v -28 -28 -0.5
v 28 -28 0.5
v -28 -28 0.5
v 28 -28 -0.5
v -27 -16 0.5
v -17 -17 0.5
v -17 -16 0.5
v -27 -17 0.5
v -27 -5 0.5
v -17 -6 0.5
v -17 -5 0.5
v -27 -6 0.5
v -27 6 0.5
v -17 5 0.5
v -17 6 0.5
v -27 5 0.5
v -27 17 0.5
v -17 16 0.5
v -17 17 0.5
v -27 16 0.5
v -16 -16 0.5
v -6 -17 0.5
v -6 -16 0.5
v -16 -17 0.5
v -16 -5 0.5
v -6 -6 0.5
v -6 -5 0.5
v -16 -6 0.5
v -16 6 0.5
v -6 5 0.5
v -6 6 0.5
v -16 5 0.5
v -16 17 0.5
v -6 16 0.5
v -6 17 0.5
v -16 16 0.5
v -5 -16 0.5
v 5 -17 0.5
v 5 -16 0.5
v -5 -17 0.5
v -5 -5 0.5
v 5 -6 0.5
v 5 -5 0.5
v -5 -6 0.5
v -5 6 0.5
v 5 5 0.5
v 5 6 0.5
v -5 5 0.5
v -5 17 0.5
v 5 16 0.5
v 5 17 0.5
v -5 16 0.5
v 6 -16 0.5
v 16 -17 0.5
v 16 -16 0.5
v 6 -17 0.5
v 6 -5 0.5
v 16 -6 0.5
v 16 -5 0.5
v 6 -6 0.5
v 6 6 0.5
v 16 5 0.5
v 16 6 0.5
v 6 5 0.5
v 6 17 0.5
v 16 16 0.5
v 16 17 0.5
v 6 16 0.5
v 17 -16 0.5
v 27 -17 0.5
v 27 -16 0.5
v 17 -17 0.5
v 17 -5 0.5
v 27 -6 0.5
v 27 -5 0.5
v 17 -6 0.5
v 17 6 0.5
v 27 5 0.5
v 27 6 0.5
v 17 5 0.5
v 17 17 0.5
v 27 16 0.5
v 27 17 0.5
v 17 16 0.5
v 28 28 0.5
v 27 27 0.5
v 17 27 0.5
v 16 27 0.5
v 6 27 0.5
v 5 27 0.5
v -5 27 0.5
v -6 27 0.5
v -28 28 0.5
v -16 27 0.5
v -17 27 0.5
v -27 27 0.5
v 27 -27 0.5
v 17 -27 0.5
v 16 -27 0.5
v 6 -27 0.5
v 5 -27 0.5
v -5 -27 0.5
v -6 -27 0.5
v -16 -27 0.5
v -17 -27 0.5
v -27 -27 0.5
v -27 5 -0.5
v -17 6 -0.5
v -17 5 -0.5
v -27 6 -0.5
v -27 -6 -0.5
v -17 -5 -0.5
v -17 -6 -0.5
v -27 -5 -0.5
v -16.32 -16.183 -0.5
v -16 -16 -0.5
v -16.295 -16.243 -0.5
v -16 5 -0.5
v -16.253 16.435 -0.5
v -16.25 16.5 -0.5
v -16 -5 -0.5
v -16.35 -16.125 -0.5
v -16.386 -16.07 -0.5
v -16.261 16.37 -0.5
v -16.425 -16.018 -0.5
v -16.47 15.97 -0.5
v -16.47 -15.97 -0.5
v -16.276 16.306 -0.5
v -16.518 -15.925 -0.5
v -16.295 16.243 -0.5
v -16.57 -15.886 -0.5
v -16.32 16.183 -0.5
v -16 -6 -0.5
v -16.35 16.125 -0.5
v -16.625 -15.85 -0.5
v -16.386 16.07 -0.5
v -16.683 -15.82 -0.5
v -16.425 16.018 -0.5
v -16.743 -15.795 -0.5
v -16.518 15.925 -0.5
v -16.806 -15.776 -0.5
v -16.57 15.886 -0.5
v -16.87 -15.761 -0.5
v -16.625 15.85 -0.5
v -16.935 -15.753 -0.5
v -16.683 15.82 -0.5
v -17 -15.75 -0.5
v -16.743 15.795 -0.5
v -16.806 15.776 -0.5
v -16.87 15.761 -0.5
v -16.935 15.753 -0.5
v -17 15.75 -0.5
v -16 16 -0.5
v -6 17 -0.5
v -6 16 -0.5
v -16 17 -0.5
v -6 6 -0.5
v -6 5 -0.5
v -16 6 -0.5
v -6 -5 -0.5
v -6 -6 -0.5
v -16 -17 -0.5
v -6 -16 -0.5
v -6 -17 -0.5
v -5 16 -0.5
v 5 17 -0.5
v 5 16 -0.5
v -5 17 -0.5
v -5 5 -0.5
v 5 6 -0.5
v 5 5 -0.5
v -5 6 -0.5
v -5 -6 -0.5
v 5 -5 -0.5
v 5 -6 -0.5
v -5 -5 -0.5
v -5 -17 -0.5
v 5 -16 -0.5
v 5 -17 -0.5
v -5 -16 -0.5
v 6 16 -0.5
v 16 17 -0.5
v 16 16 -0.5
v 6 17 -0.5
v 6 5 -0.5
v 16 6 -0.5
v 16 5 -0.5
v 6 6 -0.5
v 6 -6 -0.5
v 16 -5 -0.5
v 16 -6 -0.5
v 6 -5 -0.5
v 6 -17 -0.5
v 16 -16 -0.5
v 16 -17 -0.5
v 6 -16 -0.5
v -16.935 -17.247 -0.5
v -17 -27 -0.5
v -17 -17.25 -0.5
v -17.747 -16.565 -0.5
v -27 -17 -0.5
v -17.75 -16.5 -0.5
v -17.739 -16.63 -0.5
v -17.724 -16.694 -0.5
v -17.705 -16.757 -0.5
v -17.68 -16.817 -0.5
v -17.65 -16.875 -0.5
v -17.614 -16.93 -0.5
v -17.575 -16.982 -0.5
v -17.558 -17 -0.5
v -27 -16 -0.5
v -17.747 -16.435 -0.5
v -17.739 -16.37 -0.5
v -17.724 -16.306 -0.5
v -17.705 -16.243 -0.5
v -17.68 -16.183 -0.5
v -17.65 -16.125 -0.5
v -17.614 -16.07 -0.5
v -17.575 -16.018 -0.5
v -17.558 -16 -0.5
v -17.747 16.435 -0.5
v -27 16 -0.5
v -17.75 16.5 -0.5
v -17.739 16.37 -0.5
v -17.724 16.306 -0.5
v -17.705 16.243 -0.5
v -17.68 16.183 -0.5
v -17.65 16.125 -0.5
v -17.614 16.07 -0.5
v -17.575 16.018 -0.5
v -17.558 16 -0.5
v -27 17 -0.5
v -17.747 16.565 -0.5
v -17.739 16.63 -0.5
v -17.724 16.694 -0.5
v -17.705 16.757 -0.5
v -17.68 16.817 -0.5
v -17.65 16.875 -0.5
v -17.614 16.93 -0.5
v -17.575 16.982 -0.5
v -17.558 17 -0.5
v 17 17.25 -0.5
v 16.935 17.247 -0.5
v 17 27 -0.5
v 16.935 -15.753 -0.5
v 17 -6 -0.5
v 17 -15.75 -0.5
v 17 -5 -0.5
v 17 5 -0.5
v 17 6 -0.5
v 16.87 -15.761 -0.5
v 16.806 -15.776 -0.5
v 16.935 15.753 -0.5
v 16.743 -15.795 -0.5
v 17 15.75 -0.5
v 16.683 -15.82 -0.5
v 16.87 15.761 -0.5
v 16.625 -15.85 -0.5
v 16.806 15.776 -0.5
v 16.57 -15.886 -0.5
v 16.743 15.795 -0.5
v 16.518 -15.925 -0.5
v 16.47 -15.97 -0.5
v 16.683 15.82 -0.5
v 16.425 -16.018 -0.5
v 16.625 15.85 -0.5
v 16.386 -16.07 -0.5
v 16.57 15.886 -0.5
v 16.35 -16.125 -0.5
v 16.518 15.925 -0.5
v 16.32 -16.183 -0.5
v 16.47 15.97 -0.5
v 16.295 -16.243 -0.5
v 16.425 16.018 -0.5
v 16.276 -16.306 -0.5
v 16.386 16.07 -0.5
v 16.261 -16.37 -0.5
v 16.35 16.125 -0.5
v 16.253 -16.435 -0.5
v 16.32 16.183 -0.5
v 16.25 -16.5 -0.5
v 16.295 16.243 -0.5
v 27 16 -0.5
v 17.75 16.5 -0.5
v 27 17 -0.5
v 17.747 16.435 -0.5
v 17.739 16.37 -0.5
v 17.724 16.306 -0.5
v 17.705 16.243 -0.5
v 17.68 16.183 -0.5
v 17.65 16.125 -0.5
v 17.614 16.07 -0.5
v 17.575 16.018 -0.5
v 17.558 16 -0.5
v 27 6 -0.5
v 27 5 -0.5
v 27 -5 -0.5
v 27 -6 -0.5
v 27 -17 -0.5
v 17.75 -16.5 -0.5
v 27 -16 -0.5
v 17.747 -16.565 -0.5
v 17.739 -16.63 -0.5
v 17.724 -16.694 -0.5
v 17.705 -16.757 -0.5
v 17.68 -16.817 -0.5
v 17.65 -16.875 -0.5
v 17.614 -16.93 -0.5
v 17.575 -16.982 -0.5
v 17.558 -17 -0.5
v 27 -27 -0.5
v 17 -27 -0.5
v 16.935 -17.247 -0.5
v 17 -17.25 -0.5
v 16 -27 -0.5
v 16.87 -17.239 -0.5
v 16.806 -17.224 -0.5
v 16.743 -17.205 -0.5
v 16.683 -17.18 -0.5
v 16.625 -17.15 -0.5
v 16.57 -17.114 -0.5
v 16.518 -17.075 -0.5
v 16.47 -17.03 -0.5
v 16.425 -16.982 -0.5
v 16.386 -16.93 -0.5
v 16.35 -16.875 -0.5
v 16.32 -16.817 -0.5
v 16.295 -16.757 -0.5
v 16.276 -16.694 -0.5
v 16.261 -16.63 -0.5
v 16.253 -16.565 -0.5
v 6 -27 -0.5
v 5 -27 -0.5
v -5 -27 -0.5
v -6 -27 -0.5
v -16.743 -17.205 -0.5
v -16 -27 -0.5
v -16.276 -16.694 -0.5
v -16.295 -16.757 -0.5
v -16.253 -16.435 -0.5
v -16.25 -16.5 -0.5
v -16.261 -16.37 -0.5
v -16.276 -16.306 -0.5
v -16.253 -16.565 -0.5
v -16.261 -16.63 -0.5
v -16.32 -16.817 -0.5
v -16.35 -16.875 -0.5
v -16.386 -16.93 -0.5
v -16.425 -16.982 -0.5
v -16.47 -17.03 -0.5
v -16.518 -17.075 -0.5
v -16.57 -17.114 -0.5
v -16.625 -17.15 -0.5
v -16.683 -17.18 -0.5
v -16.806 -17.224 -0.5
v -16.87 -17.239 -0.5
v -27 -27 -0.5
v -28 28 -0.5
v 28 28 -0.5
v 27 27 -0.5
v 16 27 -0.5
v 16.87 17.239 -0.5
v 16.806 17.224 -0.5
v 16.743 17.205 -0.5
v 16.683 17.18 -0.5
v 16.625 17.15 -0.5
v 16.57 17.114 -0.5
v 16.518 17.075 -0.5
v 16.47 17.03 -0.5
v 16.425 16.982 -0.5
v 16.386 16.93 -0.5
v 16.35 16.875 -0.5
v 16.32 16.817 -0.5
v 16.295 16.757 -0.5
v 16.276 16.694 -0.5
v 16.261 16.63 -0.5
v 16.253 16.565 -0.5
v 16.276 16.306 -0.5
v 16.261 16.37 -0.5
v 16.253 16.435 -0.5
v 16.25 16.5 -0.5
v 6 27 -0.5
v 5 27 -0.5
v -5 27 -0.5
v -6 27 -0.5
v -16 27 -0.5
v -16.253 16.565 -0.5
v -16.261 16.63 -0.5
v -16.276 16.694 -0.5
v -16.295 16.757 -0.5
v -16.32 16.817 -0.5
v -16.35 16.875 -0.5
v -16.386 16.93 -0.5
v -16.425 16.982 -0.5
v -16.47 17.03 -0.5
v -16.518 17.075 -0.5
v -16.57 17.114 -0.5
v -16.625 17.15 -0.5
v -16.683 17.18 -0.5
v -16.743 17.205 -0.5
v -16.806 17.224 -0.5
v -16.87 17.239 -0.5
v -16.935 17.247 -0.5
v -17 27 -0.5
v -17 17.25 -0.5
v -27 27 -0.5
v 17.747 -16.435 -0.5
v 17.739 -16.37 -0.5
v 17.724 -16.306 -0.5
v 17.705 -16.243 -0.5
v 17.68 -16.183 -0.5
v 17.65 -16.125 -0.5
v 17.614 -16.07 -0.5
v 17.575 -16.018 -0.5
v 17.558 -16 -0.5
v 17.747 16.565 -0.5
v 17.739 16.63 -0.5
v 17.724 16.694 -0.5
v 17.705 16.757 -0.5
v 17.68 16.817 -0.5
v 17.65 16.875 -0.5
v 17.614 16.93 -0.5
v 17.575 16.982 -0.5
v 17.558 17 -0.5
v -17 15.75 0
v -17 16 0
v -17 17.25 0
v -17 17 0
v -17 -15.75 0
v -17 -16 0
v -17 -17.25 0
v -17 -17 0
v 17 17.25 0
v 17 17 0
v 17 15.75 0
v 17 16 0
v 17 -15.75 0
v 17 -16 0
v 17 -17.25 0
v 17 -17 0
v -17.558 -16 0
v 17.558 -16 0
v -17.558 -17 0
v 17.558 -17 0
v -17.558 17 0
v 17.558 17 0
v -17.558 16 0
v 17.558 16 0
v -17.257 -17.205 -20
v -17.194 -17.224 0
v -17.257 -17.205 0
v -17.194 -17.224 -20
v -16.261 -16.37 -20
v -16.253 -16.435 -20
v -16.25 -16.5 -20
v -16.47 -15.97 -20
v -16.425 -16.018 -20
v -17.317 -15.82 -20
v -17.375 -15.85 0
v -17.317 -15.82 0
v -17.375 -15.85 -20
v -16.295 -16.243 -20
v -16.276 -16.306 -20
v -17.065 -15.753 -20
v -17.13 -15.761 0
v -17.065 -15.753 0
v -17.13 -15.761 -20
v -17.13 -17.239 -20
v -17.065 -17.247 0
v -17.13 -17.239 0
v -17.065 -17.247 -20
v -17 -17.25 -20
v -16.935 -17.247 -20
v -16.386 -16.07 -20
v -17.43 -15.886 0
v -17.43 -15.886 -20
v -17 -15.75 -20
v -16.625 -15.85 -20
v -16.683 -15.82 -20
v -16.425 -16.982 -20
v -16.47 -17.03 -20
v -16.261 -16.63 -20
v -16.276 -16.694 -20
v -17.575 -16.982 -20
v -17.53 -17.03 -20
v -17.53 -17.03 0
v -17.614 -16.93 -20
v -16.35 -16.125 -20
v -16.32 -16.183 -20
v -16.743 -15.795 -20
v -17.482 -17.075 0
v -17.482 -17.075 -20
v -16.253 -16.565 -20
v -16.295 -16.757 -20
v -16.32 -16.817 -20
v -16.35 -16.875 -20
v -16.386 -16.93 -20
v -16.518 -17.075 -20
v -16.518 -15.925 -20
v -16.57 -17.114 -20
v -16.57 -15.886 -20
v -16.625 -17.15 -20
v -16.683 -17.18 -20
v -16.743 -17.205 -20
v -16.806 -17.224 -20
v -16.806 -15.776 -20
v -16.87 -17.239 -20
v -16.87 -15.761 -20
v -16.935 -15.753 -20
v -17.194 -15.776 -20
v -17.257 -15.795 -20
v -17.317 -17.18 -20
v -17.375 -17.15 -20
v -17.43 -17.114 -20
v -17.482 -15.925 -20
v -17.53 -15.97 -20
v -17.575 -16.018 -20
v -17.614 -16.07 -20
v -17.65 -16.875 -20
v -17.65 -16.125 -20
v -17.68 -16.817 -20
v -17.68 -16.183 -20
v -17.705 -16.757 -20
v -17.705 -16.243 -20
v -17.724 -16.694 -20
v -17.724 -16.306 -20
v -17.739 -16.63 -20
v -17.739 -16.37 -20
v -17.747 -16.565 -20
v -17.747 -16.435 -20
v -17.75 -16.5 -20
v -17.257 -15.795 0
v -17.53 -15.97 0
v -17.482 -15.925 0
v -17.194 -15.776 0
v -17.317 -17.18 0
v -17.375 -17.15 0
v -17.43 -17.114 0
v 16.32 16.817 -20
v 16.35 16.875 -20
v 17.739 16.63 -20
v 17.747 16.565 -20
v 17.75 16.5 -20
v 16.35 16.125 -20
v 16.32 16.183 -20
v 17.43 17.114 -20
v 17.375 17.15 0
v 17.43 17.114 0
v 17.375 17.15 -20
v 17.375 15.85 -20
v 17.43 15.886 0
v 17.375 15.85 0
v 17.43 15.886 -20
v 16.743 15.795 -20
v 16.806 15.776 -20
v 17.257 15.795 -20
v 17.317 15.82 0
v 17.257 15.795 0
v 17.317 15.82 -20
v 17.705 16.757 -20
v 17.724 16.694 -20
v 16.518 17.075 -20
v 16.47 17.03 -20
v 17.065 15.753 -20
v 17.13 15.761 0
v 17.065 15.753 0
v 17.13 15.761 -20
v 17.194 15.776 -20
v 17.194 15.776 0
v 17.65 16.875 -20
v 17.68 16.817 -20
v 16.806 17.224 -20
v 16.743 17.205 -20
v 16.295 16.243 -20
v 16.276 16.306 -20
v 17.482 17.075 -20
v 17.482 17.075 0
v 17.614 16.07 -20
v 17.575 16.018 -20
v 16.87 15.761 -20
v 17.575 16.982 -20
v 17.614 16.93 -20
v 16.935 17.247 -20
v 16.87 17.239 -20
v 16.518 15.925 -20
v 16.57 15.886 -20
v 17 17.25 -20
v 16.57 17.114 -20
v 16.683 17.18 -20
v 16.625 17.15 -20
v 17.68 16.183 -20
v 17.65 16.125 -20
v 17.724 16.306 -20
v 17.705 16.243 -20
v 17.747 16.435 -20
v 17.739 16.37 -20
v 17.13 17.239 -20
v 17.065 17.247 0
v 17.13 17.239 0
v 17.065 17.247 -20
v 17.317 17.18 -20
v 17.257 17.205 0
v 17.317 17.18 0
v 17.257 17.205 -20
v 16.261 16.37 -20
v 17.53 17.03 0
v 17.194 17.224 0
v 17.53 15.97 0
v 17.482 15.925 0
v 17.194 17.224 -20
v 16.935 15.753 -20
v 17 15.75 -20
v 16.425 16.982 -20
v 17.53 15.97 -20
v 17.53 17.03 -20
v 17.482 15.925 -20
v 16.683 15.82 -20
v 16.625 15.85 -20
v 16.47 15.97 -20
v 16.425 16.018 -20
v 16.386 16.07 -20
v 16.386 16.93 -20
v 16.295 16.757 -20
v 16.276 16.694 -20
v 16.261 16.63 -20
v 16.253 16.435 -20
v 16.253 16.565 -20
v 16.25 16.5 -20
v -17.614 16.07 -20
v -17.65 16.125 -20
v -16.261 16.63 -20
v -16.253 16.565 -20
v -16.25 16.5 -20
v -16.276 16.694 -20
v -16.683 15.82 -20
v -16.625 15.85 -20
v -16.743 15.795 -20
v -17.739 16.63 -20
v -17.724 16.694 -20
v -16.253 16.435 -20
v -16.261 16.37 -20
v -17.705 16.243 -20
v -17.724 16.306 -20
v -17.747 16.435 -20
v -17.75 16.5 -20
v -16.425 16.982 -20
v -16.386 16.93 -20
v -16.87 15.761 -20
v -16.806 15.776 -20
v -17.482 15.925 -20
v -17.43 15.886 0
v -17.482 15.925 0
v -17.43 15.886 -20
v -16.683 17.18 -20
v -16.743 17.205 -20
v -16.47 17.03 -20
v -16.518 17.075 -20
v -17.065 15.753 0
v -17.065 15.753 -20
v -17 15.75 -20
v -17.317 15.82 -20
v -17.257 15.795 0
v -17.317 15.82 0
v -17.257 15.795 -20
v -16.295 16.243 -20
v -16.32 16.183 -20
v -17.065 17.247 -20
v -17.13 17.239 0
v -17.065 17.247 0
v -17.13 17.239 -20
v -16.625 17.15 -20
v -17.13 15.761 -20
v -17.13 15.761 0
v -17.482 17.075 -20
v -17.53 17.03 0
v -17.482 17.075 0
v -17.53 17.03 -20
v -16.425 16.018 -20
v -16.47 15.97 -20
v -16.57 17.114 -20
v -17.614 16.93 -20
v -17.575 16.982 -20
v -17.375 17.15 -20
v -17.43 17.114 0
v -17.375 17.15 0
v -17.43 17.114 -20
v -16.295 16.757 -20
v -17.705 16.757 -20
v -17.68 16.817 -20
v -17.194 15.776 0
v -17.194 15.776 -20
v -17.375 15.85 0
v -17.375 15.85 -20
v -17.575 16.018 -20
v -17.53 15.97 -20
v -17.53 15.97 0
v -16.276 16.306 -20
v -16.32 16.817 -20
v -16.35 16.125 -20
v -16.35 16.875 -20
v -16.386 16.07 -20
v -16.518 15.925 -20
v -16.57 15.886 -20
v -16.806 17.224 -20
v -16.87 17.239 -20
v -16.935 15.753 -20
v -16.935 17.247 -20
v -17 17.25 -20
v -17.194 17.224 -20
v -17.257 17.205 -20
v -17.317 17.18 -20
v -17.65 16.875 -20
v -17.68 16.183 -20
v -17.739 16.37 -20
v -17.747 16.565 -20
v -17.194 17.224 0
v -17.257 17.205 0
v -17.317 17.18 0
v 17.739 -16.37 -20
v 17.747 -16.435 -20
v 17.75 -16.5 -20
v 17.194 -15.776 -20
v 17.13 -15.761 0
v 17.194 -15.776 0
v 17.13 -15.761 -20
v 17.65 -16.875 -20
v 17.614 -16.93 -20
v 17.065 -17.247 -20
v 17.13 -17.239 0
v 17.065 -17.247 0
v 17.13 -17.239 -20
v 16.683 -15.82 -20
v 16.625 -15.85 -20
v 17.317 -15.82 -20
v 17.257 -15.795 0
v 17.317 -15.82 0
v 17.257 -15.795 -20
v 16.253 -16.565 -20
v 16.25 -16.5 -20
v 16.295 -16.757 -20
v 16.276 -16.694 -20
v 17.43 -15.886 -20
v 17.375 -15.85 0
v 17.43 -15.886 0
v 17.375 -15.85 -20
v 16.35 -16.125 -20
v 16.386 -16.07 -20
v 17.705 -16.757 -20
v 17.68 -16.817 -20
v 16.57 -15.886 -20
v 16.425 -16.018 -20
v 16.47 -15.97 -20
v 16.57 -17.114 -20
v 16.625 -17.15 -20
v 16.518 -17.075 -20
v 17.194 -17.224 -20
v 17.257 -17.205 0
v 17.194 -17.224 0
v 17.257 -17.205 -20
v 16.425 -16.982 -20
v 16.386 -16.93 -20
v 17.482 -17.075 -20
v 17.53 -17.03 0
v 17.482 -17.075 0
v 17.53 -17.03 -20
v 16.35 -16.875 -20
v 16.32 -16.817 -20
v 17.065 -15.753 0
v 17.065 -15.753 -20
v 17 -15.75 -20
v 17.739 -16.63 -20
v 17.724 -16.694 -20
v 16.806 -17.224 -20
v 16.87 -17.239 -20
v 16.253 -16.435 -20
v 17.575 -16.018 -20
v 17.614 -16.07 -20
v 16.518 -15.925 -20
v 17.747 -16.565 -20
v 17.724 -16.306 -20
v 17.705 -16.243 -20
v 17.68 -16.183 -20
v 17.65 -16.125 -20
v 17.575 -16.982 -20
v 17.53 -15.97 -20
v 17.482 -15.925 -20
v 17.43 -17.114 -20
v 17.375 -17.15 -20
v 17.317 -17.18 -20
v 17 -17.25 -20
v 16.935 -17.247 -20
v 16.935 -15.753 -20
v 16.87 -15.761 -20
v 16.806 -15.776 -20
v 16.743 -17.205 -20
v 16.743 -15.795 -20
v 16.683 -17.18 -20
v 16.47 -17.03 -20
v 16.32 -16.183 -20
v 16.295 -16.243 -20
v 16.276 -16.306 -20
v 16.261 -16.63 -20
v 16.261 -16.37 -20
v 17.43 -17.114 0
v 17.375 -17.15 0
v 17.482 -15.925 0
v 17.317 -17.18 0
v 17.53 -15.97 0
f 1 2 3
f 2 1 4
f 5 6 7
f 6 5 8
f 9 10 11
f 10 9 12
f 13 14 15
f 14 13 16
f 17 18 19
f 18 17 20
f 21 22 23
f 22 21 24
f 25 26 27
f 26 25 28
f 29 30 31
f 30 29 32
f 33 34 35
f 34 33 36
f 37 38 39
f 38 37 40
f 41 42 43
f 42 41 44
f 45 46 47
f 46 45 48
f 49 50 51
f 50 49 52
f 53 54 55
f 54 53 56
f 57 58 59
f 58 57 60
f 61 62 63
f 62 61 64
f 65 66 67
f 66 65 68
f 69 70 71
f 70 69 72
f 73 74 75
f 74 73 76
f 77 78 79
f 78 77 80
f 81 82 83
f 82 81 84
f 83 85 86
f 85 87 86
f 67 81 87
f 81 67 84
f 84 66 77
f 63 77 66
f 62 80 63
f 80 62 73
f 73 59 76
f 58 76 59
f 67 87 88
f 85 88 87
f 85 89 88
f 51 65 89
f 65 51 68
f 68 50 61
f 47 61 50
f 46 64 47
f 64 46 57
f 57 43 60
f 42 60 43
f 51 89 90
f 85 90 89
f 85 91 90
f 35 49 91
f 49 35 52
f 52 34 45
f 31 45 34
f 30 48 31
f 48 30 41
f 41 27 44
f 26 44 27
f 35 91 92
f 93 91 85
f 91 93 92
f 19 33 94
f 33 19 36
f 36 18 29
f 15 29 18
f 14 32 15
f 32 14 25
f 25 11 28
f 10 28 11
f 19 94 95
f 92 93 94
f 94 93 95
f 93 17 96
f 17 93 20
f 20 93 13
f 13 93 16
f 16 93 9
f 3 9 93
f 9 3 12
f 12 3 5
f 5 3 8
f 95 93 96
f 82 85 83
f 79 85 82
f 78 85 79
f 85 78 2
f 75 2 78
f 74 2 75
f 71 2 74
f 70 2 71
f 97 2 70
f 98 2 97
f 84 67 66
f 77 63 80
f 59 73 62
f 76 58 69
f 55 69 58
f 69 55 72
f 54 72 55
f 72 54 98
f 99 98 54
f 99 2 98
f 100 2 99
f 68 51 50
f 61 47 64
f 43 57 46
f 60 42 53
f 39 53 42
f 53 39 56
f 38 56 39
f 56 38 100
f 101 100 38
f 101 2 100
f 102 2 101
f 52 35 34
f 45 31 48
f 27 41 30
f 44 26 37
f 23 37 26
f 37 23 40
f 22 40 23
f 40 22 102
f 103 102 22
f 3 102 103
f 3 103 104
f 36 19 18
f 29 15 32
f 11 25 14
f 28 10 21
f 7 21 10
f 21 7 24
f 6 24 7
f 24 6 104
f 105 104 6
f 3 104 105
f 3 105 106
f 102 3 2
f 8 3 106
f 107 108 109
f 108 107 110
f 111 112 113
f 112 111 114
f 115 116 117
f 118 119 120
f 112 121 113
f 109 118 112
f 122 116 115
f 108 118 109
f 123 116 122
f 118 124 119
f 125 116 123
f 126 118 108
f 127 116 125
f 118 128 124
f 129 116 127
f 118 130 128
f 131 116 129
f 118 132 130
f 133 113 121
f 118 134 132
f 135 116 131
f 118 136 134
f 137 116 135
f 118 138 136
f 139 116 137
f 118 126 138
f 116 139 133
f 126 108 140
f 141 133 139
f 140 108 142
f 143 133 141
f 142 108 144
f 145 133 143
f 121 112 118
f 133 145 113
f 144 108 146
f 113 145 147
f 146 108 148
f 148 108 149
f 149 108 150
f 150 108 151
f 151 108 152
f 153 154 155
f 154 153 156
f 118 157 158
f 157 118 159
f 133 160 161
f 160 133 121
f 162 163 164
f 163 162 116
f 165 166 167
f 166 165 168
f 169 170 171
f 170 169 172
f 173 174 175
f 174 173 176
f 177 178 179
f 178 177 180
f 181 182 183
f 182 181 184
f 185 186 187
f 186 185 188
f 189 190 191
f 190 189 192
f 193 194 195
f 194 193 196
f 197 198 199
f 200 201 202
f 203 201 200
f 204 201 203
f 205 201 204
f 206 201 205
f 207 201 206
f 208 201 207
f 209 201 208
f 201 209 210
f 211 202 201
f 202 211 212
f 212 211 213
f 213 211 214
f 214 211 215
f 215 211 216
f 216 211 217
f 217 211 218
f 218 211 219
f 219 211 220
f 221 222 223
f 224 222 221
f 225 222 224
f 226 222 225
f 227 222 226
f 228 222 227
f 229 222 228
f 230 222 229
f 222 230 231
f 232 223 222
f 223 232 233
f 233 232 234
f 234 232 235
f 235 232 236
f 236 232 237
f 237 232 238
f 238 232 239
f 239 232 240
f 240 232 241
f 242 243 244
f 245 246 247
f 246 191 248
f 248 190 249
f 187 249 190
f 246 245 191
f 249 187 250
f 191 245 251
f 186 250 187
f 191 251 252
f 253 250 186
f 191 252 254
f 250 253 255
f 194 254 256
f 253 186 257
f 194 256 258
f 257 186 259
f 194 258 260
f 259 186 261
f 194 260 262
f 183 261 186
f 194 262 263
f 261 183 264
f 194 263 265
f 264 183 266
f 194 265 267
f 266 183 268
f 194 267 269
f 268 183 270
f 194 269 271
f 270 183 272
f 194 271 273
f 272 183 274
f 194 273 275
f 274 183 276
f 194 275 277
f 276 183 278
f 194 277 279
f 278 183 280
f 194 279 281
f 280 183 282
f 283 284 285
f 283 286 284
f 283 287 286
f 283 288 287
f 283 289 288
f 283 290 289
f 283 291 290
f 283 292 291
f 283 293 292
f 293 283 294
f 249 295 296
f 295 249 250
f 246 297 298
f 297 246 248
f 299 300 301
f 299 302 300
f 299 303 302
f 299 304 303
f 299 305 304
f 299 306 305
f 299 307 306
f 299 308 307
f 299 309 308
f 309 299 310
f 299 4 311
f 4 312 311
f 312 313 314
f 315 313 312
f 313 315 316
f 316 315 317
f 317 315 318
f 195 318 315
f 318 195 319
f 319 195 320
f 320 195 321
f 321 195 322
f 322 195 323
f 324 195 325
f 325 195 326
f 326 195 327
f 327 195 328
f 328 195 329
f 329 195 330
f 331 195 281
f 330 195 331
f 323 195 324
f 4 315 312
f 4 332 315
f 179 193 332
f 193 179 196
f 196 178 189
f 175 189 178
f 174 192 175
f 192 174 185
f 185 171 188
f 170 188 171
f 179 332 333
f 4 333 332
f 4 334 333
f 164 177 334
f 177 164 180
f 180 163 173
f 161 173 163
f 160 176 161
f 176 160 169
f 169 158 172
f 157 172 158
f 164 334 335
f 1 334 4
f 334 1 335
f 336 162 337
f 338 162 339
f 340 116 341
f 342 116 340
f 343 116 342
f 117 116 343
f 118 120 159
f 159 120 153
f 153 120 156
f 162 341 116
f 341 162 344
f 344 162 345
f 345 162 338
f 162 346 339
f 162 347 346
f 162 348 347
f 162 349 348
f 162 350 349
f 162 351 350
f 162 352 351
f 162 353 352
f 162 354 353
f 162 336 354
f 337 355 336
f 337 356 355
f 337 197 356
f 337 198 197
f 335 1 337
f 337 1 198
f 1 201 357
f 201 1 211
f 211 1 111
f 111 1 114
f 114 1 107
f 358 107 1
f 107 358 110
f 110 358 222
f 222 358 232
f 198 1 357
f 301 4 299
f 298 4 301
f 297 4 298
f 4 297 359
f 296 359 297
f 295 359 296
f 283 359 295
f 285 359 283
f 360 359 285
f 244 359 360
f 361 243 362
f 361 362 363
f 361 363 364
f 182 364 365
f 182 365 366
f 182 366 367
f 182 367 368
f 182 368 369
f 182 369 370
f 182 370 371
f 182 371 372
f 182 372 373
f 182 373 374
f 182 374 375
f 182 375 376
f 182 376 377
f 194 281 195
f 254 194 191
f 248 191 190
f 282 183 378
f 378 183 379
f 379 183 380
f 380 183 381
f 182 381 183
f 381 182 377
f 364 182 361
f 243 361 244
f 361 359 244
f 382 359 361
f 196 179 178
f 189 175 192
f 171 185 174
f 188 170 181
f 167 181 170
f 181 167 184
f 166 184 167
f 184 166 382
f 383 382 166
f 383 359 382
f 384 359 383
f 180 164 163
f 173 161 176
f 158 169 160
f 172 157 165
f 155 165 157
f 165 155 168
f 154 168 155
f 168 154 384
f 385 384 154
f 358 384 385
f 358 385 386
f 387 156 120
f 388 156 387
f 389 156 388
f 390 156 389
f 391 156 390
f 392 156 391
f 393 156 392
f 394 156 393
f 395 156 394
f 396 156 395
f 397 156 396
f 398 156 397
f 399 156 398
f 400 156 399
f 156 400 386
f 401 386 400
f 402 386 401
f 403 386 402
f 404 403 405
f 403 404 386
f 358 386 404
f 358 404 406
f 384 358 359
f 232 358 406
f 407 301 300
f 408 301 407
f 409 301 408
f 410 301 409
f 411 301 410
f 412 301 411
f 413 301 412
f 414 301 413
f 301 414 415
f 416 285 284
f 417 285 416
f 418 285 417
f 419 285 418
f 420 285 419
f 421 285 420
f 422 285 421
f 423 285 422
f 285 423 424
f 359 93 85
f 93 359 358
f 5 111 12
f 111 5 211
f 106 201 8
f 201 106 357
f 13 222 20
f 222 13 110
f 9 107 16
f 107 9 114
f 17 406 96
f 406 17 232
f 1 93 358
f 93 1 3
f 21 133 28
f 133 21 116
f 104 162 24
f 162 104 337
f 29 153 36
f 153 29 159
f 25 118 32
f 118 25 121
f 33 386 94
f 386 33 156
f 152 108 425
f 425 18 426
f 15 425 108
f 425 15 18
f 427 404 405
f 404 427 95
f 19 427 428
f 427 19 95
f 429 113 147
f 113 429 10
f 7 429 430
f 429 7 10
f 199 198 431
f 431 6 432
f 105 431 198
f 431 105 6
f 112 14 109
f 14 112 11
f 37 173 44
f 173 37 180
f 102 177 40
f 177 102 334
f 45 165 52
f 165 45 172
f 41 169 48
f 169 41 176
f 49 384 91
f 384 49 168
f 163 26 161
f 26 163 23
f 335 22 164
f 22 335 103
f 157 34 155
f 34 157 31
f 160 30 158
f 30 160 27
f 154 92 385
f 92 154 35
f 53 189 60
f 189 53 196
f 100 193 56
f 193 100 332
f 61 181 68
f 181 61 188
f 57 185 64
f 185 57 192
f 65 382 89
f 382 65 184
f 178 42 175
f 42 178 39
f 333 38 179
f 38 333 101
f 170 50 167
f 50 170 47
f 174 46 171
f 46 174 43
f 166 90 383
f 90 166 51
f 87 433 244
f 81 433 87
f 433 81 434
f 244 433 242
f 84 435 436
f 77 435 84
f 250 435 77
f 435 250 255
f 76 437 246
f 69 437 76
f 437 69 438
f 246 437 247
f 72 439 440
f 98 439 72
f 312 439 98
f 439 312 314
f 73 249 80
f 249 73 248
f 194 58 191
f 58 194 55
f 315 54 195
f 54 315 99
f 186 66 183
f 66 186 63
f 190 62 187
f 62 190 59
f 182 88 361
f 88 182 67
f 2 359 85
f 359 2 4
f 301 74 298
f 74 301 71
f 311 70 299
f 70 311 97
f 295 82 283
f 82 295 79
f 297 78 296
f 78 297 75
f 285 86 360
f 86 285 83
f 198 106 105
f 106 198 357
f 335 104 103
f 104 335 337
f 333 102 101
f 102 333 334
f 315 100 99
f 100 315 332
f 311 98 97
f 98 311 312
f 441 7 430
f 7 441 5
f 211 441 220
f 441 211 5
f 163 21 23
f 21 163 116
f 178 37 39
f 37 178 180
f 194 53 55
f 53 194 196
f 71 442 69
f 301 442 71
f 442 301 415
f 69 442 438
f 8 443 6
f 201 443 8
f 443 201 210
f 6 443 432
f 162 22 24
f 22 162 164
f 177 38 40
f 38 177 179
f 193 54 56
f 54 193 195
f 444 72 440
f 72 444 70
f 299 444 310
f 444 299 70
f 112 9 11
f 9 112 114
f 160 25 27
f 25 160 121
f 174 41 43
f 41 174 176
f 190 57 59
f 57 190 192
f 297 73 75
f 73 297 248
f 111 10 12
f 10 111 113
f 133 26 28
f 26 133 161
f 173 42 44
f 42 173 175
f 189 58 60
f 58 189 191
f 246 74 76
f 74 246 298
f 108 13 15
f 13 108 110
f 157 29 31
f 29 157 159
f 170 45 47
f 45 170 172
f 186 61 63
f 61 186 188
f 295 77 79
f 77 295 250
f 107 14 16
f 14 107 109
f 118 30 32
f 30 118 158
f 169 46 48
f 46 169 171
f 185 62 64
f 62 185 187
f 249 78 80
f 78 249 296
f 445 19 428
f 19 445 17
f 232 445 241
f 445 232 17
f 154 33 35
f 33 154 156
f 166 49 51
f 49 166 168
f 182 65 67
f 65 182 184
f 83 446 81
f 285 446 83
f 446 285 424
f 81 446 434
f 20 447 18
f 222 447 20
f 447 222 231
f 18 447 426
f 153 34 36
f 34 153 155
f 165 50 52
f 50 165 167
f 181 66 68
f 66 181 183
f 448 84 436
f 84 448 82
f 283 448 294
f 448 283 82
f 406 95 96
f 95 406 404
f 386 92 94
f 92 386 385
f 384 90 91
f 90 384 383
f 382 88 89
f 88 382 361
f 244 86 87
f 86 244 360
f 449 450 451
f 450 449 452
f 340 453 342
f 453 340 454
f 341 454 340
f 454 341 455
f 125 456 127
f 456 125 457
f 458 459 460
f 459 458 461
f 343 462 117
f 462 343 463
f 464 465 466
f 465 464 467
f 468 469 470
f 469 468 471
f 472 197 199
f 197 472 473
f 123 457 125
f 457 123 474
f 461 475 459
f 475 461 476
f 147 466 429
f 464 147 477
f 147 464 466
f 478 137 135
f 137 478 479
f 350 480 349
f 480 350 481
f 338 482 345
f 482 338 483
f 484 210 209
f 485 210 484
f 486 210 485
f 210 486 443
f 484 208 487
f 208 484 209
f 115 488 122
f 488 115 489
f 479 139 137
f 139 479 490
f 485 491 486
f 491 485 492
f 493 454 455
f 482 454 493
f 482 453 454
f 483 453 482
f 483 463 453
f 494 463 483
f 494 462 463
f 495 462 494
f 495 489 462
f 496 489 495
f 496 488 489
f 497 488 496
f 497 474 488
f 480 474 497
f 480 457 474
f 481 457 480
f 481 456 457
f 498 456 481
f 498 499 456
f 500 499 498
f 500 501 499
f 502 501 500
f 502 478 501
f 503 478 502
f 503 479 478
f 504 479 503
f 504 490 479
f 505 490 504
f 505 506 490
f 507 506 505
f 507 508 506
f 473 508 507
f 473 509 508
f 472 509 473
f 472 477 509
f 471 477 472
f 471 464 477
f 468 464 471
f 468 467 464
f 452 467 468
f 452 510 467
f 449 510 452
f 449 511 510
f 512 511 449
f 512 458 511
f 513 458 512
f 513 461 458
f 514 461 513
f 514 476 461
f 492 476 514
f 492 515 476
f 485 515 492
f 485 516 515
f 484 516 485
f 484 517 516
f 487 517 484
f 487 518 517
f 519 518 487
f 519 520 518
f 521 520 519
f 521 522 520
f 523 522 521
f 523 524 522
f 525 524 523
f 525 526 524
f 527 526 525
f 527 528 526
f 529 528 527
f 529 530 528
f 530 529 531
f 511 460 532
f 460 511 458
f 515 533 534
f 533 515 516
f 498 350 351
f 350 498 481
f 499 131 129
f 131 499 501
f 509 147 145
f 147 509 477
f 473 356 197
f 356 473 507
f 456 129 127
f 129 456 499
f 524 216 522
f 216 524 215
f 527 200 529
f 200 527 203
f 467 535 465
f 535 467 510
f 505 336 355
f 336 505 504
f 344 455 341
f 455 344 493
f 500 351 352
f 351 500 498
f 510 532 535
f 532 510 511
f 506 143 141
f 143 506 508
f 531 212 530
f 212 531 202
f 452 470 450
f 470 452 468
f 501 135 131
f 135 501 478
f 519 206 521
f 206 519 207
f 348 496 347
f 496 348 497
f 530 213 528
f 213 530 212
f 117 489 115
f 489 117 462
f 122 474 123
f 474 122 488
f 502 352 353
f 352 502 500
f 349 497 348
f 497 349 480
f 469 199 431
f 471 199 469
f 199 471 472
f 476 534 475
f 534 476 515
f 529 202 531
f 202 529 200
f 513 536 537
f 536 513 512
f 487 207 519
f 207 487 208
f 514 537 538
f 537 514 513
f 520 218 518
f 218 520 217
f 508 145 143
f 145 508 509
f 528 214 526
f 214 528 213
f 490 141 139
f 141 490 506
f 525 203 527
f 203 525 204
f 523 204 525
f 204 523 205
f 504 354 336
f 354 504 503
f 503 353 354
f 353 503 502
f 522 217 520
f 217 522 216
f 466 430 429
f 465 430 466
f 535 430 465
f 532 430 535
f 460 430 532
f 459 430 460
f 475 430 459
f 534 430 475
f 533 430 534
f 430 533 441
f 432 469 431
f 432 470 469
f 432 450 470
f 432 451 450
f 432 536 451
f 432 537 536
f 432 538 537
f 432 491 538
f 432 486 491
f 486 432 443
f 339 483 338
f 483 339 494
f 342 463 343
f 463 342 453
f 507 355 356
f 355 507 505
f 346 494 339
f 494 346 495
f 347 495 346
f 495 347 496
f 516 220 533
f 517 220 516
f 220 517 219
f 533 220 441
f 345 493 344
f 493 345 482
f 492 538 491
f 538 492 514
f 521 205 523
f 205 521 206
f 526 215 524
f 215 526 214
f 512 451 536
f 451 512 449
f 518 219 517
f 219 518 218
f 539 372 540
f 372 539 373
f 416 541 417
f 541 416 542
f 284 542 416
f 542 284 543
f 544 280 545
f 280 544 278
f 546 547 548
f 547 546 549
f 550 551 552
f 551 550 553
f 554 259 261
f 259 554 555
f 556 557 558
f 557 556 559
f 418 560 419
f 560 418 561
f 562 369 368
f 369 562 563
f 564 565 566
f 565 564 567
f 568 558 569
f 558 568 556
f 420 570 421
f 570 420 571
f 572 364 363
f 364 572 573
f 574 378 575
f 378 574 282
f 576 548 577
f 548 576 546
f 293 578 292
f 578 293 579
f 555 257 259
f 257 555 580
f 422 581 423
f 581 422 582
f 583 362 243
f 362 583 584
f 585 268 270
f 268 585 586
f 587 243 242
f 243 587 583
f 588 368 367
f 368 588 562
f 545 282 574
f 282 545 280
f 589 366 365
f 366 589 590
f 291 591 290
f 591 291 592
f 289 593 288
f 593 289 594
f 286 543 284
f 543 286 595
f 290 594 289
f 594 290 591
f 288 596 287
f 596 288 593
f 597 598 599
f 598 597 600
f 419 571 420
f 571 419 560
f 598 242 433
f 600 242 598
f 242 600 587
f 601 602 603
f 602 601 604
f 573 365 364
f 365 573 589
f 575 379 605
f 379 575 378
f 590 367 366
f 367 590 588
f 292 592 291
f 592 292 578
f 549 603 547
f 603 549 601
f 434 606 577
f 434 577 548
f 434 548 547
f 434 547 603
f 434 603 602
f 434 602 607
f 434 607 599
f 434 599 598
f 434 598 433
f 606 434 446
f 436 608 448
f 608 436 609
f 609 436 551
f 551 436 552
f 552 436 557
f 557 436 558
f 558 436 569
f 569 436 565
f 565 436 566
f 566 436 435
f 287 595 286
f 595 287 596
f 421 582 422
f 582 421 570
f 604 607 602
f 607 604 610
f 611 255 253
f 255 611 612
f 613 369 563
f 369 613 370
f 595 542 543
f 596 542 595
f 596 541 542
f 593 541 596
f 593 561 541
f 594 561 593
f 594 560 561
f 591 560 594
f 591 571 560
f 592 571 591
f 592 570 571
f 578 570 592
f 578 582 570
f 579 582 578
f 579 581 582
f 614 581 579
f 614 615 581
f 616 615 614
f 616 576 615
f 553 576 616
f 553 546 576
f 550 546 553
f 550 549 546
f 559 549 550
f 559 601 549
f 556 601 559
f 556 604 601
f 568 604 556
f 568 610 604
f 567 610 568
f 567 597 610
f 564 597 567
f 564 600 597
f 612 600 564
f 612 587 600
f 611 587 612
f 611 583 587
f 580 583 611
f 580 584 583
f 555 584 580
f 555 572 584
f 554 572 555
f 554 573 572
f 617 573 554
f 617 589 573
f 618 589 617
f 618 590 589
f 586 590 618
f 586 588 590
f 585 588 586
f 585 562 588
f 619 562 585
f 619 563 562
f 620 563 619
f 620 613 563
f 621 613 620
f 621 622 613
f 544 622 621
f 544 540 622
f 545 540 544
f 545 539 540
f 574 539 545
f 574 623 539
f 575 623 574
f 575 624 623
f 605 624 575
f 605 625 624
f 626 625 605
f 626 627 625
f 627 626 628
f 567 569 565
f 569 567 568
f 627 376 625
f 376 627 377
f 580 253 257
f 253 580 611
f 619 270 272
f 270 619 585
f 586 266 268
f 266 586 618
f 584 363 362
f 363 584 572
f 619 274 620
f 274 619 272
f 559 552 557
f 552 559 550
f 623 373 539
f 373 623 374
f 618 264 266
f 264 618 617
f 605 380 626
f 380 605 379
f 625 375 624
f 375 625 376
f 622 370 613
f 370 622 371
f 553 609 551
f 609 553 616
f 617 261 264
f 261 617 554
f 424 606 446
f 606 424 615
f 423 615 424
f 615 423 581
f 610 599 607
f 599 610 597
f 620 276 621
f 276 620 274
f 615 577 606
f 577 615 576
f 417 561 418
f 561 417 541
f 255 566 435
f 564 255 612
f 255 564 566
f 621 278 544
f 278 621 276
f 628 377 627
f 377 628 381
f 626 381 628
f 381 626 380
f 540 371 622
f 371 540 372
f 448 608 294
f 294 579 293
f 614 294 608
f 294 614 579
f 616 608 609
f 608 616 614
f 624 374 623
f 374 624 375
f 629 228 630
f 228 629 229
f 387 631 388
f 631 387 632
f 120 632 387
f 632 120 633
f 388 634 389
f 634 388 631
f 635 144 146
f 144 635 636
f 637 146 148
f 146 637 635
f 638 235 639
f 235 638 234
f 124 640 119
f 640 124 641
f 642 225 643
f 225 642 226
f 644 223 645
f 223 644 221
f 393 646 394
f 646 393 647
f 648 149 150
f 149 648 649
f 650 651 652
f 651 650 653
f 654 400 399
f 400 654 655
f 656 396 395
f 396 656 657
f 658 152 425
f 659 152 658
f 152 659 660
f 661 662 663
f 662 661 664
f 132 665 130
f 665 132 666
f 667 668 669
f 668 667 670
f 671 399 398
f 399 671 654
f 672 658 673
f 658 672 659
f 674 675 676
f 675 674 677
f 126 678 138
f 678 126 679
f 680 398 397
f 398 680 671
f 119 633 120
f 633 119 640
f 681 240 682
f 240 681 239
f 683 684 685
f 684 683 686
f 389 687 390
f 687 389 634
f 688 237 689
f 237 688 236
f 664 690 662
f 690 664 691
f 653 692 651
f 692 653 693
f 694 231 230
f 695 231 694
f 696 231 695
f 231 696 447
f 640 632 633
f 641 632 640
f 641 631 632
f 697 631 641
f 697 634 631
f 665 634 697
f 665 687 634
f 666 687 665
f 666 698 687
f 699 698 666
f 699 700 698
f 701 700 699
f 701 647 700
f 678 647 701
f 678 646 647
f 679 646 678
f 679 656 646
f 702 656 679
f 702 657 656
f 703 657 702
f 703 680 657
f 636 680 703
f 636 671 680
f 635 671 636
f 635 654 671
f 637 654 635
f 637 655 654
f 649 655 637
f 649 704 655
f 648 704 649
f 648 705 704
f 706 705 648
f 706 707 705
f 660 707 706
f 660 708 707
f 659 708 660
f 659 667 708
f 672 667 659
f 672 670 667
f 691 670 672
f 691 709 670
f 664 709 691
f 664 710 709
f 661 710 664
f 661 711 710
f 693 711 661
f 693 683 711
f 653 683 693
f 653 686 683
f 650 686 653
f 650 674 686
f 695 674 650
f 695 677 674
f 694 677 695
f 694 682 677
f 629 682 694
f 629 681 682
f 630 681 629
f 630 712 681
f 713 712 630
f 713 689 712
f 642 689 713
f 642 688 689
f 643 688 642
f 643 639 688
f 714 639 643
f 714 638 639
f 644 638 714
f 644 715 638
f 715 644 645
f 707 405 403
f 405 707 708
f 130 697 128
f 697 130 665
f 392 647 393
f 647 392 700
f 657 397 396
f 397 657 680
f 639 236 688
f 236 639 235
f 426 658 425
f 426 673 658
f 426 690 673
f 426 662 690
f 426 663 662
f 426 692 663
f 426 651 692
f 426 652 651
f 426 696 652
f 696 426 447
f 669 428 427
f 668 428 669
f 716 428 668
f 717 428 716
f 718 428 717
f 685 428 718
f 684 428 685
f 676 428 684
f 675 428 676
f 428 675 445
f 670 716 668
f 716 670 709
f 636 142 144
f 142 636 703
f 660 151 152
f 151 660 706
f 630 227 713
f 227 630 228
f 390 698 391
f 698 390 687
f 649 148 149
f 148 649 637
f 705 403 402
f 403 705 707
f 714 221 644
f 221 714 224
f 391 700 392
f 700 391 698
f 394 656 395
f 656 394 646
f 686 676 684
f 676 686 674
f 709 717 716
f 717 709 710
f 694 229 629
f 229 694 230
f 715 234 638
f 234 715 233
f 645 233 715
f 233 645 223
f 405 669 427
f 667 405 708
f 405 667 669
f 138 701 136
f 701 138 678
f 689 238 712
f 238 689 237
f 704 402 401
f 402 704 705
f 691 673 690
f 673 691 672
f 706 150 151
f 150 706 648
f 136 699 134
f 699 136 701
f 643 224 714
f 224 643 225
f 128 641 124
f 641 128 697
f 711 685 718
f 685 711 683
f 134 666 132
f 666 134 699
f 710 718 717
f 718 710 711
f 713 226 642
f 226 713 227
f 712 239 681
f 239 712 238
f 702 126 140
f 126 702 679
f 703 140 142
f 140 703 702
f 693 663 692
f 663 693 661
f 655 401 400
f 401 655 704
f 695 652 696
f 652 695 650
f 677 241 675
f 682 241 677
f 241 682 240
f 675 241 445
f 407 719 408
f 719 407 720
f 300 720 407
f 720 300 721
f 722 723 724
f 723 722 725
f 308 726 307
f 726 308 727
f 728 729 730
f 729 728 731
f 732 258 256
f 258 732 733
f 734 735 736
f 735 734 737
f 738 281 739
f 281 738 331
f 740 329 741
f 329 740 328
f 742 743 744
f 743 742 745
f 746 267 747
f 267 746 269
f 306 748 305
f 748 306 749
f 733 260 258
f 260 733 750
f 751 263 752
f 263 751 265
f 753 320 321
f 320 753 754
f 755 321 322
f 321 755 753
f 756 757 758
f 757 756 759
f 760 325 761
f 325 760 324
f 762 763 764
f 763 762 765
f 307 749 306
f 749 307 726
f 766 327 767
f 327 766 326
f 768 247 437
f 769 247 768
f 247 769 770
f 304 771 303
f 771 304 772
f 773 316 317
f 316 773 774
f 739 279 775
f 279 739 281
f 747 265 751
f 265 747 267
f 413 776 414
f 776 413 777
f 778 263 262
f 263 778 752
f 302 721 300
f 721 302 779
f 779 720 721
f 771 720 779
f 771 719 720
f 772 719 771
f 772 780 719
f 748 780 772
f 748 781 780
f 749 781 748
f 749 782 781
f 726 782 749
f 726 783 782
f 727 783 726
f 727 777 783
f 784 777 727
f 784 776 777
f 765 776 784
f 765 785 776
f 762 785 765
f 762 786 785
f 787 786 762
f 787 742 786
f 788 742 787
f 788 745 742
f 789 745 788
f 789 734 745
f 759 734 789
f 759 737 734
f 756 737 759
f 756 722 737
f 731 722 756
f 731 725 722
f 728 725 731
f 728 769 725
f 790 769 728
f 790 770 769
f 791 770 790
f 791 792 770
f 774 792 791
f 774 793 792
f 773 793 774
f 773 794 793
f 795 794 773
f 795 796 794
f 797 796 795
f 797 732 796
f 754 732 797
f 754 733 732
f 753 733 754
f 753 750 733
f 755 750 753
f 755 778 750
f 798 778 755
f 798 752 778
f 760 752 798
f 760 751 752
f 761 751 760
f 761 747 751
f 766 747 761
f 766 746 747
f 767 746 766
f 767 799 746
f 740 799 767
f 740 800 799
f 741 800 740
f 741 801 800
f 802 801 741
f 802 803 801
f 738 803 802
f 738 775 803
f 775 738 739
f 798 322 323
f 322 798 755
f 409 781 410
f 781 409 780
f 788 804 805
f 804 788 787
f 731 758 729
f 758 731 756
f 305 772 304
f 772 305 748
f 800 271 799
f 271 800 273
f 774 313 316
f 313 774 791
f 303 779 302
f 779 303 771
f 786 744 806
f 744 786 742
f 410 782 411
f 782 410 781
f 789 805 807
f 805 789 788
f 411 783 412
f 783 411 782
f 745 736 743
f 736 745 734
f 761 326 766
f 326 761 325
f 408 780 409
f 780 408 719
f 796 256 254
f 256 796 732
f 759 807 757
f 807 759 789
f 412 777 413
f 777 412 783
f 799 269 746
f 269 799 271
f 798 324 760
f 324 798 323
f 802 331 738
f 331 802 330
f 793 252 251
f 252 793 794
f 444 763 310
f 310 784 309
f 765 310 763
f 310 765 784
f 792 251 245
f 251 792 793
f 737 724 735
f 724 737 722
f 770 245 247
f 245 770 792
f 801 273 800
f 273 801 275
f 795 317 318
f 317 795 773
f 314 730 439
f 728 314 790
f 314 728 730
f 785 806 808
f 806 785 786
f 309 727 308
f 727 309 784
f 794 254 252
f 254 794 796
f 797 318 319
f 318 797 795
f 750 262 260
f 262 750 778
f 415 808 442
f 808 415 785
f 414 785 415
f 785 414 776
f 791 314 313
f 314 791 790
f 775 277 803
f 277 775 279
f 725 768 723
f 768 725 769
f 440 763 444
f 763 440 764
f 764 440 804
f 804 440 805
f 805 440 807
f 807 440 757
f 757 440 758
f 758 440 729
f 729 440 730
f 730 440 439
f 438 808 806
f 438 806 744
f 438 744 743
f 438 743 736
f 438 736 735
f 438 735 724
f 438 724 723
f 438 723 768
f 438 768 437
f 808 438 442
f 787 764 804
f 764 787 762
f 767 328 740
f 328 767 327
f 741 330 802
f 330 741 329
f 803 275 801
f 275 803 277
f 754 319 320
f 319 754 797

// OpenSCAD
foot=20;
window_num = 5; // number of windows
window_size = 10; // size of individual windows
strut_size = 1; // size of the struts
thickness=strut_size*0.75;
    for (i = [-window_num/2:window_num/2]) {
       rotate([0, 0,-90])
    translate ([0 , (window_size + strut_size) * i, 0 ])
    cube (size=[window_num * (window_size + strut_size) + strut_size, strut_size, strut_size], center=true);
    }

    for (i = [-window_num/2:window_num/2]) {
    translate ([0, (window_size + strut_size) * i, 0])
    cube (size=[window_num * (window_size + strut_size) + strut_size, strut_size, strut_size], center=true);
    }
// Foots
translate([-window_size*1.5-strut_size*2,-window_size*1.5-strut_size*1.5,-foot/2])
    cylinder(r=thickness, h=foot, center=true, $fa=5, $fs=0.01);
    
translate([+window_size*1.5+strut_size*2,+window_size*1.5+strut_size*1.5,-foot/2])
    cylinder(r=thickness, h=foot, center=true, $fa=5, $fs=0.01); 
translate([-window_size*1.5-strut_size*2,+window_size*1.5+strut_size*1.5,-foot/2])
    cylinder(r=thickness, h=foot, center=true, $fa=5, $fs=0.01); 
translate([+window_size*1.5+strut_size*2,-window_size*1.5-strut_size*1.5,-foot/2])
    cylinder(r=thickness, h=foot, center=true, $fa=5, $fs=0.01); 
